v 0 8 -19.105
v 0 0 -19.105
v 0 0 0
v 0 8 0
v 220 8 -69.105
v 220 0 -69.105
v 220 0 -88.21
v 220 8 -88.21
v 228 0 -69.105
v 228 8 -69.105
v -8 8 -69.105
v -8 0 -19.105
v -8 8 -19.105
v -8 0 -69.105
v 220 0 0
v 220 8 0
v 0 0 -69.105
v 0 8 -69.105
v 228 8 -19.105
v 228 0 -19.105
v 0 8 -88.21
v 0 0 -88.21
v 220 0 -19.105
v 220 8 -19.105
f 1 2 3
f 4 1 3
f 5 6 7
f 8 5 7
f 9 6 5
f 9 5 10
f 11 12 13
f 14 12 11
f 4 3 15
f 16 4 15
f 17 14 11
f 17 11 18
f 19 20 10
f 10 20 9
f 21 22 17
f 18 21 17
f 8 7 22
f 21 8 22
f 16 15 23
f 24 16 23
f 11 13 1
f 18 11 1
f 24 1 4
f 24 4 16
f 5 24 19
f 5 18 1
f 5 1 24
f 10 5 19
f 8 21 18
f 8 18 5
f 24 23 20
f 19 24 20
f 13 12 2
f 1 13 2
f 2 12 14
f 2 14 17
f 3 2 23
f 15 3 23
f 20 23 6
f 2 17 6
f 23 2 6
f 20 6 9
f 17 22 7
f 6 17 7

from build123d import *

# Parameters (mm, degrees)
SKETCH1_W           = 8
SKETCH1_H           = 50
BOSS_EXTRUDE1_DEPTH = 8


with BuildPart() as part:
    # Sketch1 → Boss-Extrude1 (new body)
    with BuildSketch(Plane(origin=(0, 0, 0), x_dir=(1, 0, 0), z_dir=(0, 1, 0))):
        with Locations((-4, 44.105)):
            Rectangle(SKETCH1_W, SKETCH1_H)
        Polygon((110, 0), (110, 88.21), (0, 88.21), (0, 69.105), (0, 19.105), (0, 0), align=None)
        Polygon((220, 88.21), (110, 88.21), (110, 0), (220, 0), (220, 19.105), (220, 69.105), align=None)
        with Locations((224, 44.105)):
            Rectangle(SKETCH1_W, SKETCH1_H)
    extrude(amount=BOSS_EXTRUDE1_DEPTH)


solid = part.part
